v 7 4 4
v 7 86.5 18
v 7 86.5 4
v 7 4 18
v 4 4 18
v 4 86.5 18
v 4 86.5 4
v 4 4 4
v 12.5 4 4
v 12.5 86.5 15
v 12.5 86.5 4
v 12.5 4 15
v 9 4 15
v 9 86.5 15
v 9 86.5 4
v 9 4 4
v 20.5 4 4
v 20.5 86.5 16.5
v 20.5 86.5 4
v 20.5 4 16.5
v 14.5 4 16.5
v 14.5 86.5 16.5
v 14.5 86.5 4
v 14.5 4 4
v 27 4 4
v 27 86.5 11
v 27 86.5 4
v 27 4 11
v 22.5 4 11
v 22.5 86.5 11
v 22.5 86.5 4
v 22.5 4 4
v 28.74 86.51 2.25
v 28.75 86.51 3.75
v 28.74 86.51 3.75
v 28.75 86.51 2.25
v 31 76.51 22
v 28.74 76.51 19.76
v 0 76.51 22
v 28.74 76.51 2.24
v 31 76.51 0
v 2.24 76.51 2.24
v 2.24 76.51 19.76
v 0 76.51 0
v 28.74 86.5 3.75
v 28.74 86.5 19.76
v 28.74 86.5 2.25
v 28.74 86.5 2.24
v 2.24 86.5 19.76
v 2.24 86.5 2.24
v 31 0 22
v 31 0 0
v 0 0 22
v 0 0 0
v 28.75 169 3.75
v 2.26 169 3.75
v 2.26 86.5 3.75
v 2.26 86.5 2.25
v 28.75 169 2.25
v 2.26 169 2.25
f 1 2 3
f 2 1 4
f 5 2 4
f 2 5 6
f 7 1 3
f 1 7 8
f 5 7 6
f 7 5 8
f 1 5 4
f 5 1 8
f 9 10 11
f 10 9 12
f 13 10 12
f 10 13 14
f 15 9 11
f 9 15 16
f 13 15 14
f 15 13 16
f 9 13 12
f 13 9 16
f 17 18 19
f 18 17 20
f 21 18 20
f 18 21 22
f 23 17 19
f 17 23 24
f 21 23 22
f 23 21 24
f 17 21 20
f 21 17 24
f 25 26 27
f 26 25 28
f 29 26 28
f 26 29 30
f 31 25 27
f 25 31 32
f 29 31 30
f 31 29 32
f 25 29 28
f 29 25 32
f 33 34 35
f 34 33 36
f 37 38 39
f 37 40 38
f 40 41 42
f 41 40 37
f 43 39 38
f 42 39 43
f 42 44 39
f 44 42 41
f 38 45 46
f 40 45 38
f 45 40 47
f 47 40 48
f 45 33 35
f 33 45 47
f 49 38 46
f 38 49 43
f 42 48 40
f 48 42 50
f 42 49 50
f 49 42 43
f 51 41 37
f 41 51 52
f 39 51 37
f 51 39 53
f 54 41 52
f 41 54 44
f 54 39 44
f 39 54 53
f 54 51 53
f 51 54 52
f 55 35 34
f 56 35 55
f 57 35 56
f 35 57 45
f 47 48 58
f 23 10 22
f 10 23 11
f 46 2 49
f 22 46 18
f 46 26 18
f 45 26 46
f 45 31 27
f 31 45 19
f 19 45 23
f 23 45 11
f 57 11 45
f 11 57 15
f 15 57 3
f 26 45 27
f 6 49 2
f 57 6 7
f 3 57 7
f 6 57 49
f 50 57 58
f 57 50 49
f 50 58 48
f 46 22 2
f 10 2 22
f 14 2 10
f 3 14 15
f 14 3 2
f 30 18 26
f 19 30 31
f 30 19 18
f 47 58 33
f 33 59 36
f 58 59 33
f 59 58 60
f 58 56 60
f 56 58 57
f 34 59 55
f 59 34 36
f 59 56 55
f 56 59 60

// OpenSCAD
$fn = 180;
eps =  0.01;
tol = 0.25;

function sum(arr,i=0,s=0) =
    i < len(arr) ?
    sum(arr,i+1,s+arr[i]) :
    s;
 
function sum_c(arr,c,i=0,s=0) =
    i < len(arr) ?
    sum_c(arr,c,i+1,s+arr[i][c]) :
    s;

function sum_cl(arr,c,l,i=0,s=0) =
    i < l ?
    sum_cl(arr,c,l,i+1,s+arr[i][c]) :
    s;
    
function max_c(arr,c,i=0,m=0) =
    i < len(arr) ?
    max_c(arr,c,i+1,max([m,arr[i][c]])) :
    m;

// scalpel parameters
sp =    [
        [3.0,165,14.0],
        [3.5,165,11.0],
        [6.0,145,12.5],
        [4.5,125, 7.0]
        ];

// scalpel case parameters
wt = 4;
// scalpel distances
sd = 2;

lh = 10;

module scalpel_case()
{
    _x = 2*wt+(len(sp)-1)*sd+sum_c(sp,0);
    _y = 2*wt+max_c(sp,1);
    _z = 2*wt+max_c(sp,2);


    difference()
    {
        // main box
        cube([_x,_y,_z]);
        
        // middle part cut
        translate([-eps,_y/2,wt-tol]) cube([_x+2*eps,_y,_z]);
        
        // lower cut
        translate([-eps,_y/2,-_z+wt/2+tol]) cube([_x+2*eps,_y,_z]);
        
        // left cut
        translate([-eps,_y/2,0]) cube([wt/2+2*eps+tol,_y+tol,_z]); 
        
        // right cut
        translate([_x-wt/2-tol,_y/2,0]) cube([wt/2+tol+eps,_y+tol,_z]);
        
        // upper cut
        translate([0,_y-wt,0]) cube([_x,_y,_z]);
        
        // scalpel case cuts
        for(i=[0:len(sp)-1])
        {
            _cx = sp[i][0];
            _cy = sp[i][1];
            _cz = sp[i][2];
            
            _cxo = wt+sum_cl(sp,0,i)+i*sd;
            translate([_cxo,wt,wt]) cube([_cx,_cy,_cz]);
        }
        
        // cut for scalpel
        translate([-eps,_y/2-lh+eps,-eps])
        difference()
        {
            cube([_x+2*eps,lh,_z+2*eps]);
            translate([wt/2+tol,-eps,wt/2+tol])
                cube([_x-wt-2*tol,lh+2*eps,_z+2*eps-wt-2*tol]);
        }
    }
    
}

scalpel_case();
